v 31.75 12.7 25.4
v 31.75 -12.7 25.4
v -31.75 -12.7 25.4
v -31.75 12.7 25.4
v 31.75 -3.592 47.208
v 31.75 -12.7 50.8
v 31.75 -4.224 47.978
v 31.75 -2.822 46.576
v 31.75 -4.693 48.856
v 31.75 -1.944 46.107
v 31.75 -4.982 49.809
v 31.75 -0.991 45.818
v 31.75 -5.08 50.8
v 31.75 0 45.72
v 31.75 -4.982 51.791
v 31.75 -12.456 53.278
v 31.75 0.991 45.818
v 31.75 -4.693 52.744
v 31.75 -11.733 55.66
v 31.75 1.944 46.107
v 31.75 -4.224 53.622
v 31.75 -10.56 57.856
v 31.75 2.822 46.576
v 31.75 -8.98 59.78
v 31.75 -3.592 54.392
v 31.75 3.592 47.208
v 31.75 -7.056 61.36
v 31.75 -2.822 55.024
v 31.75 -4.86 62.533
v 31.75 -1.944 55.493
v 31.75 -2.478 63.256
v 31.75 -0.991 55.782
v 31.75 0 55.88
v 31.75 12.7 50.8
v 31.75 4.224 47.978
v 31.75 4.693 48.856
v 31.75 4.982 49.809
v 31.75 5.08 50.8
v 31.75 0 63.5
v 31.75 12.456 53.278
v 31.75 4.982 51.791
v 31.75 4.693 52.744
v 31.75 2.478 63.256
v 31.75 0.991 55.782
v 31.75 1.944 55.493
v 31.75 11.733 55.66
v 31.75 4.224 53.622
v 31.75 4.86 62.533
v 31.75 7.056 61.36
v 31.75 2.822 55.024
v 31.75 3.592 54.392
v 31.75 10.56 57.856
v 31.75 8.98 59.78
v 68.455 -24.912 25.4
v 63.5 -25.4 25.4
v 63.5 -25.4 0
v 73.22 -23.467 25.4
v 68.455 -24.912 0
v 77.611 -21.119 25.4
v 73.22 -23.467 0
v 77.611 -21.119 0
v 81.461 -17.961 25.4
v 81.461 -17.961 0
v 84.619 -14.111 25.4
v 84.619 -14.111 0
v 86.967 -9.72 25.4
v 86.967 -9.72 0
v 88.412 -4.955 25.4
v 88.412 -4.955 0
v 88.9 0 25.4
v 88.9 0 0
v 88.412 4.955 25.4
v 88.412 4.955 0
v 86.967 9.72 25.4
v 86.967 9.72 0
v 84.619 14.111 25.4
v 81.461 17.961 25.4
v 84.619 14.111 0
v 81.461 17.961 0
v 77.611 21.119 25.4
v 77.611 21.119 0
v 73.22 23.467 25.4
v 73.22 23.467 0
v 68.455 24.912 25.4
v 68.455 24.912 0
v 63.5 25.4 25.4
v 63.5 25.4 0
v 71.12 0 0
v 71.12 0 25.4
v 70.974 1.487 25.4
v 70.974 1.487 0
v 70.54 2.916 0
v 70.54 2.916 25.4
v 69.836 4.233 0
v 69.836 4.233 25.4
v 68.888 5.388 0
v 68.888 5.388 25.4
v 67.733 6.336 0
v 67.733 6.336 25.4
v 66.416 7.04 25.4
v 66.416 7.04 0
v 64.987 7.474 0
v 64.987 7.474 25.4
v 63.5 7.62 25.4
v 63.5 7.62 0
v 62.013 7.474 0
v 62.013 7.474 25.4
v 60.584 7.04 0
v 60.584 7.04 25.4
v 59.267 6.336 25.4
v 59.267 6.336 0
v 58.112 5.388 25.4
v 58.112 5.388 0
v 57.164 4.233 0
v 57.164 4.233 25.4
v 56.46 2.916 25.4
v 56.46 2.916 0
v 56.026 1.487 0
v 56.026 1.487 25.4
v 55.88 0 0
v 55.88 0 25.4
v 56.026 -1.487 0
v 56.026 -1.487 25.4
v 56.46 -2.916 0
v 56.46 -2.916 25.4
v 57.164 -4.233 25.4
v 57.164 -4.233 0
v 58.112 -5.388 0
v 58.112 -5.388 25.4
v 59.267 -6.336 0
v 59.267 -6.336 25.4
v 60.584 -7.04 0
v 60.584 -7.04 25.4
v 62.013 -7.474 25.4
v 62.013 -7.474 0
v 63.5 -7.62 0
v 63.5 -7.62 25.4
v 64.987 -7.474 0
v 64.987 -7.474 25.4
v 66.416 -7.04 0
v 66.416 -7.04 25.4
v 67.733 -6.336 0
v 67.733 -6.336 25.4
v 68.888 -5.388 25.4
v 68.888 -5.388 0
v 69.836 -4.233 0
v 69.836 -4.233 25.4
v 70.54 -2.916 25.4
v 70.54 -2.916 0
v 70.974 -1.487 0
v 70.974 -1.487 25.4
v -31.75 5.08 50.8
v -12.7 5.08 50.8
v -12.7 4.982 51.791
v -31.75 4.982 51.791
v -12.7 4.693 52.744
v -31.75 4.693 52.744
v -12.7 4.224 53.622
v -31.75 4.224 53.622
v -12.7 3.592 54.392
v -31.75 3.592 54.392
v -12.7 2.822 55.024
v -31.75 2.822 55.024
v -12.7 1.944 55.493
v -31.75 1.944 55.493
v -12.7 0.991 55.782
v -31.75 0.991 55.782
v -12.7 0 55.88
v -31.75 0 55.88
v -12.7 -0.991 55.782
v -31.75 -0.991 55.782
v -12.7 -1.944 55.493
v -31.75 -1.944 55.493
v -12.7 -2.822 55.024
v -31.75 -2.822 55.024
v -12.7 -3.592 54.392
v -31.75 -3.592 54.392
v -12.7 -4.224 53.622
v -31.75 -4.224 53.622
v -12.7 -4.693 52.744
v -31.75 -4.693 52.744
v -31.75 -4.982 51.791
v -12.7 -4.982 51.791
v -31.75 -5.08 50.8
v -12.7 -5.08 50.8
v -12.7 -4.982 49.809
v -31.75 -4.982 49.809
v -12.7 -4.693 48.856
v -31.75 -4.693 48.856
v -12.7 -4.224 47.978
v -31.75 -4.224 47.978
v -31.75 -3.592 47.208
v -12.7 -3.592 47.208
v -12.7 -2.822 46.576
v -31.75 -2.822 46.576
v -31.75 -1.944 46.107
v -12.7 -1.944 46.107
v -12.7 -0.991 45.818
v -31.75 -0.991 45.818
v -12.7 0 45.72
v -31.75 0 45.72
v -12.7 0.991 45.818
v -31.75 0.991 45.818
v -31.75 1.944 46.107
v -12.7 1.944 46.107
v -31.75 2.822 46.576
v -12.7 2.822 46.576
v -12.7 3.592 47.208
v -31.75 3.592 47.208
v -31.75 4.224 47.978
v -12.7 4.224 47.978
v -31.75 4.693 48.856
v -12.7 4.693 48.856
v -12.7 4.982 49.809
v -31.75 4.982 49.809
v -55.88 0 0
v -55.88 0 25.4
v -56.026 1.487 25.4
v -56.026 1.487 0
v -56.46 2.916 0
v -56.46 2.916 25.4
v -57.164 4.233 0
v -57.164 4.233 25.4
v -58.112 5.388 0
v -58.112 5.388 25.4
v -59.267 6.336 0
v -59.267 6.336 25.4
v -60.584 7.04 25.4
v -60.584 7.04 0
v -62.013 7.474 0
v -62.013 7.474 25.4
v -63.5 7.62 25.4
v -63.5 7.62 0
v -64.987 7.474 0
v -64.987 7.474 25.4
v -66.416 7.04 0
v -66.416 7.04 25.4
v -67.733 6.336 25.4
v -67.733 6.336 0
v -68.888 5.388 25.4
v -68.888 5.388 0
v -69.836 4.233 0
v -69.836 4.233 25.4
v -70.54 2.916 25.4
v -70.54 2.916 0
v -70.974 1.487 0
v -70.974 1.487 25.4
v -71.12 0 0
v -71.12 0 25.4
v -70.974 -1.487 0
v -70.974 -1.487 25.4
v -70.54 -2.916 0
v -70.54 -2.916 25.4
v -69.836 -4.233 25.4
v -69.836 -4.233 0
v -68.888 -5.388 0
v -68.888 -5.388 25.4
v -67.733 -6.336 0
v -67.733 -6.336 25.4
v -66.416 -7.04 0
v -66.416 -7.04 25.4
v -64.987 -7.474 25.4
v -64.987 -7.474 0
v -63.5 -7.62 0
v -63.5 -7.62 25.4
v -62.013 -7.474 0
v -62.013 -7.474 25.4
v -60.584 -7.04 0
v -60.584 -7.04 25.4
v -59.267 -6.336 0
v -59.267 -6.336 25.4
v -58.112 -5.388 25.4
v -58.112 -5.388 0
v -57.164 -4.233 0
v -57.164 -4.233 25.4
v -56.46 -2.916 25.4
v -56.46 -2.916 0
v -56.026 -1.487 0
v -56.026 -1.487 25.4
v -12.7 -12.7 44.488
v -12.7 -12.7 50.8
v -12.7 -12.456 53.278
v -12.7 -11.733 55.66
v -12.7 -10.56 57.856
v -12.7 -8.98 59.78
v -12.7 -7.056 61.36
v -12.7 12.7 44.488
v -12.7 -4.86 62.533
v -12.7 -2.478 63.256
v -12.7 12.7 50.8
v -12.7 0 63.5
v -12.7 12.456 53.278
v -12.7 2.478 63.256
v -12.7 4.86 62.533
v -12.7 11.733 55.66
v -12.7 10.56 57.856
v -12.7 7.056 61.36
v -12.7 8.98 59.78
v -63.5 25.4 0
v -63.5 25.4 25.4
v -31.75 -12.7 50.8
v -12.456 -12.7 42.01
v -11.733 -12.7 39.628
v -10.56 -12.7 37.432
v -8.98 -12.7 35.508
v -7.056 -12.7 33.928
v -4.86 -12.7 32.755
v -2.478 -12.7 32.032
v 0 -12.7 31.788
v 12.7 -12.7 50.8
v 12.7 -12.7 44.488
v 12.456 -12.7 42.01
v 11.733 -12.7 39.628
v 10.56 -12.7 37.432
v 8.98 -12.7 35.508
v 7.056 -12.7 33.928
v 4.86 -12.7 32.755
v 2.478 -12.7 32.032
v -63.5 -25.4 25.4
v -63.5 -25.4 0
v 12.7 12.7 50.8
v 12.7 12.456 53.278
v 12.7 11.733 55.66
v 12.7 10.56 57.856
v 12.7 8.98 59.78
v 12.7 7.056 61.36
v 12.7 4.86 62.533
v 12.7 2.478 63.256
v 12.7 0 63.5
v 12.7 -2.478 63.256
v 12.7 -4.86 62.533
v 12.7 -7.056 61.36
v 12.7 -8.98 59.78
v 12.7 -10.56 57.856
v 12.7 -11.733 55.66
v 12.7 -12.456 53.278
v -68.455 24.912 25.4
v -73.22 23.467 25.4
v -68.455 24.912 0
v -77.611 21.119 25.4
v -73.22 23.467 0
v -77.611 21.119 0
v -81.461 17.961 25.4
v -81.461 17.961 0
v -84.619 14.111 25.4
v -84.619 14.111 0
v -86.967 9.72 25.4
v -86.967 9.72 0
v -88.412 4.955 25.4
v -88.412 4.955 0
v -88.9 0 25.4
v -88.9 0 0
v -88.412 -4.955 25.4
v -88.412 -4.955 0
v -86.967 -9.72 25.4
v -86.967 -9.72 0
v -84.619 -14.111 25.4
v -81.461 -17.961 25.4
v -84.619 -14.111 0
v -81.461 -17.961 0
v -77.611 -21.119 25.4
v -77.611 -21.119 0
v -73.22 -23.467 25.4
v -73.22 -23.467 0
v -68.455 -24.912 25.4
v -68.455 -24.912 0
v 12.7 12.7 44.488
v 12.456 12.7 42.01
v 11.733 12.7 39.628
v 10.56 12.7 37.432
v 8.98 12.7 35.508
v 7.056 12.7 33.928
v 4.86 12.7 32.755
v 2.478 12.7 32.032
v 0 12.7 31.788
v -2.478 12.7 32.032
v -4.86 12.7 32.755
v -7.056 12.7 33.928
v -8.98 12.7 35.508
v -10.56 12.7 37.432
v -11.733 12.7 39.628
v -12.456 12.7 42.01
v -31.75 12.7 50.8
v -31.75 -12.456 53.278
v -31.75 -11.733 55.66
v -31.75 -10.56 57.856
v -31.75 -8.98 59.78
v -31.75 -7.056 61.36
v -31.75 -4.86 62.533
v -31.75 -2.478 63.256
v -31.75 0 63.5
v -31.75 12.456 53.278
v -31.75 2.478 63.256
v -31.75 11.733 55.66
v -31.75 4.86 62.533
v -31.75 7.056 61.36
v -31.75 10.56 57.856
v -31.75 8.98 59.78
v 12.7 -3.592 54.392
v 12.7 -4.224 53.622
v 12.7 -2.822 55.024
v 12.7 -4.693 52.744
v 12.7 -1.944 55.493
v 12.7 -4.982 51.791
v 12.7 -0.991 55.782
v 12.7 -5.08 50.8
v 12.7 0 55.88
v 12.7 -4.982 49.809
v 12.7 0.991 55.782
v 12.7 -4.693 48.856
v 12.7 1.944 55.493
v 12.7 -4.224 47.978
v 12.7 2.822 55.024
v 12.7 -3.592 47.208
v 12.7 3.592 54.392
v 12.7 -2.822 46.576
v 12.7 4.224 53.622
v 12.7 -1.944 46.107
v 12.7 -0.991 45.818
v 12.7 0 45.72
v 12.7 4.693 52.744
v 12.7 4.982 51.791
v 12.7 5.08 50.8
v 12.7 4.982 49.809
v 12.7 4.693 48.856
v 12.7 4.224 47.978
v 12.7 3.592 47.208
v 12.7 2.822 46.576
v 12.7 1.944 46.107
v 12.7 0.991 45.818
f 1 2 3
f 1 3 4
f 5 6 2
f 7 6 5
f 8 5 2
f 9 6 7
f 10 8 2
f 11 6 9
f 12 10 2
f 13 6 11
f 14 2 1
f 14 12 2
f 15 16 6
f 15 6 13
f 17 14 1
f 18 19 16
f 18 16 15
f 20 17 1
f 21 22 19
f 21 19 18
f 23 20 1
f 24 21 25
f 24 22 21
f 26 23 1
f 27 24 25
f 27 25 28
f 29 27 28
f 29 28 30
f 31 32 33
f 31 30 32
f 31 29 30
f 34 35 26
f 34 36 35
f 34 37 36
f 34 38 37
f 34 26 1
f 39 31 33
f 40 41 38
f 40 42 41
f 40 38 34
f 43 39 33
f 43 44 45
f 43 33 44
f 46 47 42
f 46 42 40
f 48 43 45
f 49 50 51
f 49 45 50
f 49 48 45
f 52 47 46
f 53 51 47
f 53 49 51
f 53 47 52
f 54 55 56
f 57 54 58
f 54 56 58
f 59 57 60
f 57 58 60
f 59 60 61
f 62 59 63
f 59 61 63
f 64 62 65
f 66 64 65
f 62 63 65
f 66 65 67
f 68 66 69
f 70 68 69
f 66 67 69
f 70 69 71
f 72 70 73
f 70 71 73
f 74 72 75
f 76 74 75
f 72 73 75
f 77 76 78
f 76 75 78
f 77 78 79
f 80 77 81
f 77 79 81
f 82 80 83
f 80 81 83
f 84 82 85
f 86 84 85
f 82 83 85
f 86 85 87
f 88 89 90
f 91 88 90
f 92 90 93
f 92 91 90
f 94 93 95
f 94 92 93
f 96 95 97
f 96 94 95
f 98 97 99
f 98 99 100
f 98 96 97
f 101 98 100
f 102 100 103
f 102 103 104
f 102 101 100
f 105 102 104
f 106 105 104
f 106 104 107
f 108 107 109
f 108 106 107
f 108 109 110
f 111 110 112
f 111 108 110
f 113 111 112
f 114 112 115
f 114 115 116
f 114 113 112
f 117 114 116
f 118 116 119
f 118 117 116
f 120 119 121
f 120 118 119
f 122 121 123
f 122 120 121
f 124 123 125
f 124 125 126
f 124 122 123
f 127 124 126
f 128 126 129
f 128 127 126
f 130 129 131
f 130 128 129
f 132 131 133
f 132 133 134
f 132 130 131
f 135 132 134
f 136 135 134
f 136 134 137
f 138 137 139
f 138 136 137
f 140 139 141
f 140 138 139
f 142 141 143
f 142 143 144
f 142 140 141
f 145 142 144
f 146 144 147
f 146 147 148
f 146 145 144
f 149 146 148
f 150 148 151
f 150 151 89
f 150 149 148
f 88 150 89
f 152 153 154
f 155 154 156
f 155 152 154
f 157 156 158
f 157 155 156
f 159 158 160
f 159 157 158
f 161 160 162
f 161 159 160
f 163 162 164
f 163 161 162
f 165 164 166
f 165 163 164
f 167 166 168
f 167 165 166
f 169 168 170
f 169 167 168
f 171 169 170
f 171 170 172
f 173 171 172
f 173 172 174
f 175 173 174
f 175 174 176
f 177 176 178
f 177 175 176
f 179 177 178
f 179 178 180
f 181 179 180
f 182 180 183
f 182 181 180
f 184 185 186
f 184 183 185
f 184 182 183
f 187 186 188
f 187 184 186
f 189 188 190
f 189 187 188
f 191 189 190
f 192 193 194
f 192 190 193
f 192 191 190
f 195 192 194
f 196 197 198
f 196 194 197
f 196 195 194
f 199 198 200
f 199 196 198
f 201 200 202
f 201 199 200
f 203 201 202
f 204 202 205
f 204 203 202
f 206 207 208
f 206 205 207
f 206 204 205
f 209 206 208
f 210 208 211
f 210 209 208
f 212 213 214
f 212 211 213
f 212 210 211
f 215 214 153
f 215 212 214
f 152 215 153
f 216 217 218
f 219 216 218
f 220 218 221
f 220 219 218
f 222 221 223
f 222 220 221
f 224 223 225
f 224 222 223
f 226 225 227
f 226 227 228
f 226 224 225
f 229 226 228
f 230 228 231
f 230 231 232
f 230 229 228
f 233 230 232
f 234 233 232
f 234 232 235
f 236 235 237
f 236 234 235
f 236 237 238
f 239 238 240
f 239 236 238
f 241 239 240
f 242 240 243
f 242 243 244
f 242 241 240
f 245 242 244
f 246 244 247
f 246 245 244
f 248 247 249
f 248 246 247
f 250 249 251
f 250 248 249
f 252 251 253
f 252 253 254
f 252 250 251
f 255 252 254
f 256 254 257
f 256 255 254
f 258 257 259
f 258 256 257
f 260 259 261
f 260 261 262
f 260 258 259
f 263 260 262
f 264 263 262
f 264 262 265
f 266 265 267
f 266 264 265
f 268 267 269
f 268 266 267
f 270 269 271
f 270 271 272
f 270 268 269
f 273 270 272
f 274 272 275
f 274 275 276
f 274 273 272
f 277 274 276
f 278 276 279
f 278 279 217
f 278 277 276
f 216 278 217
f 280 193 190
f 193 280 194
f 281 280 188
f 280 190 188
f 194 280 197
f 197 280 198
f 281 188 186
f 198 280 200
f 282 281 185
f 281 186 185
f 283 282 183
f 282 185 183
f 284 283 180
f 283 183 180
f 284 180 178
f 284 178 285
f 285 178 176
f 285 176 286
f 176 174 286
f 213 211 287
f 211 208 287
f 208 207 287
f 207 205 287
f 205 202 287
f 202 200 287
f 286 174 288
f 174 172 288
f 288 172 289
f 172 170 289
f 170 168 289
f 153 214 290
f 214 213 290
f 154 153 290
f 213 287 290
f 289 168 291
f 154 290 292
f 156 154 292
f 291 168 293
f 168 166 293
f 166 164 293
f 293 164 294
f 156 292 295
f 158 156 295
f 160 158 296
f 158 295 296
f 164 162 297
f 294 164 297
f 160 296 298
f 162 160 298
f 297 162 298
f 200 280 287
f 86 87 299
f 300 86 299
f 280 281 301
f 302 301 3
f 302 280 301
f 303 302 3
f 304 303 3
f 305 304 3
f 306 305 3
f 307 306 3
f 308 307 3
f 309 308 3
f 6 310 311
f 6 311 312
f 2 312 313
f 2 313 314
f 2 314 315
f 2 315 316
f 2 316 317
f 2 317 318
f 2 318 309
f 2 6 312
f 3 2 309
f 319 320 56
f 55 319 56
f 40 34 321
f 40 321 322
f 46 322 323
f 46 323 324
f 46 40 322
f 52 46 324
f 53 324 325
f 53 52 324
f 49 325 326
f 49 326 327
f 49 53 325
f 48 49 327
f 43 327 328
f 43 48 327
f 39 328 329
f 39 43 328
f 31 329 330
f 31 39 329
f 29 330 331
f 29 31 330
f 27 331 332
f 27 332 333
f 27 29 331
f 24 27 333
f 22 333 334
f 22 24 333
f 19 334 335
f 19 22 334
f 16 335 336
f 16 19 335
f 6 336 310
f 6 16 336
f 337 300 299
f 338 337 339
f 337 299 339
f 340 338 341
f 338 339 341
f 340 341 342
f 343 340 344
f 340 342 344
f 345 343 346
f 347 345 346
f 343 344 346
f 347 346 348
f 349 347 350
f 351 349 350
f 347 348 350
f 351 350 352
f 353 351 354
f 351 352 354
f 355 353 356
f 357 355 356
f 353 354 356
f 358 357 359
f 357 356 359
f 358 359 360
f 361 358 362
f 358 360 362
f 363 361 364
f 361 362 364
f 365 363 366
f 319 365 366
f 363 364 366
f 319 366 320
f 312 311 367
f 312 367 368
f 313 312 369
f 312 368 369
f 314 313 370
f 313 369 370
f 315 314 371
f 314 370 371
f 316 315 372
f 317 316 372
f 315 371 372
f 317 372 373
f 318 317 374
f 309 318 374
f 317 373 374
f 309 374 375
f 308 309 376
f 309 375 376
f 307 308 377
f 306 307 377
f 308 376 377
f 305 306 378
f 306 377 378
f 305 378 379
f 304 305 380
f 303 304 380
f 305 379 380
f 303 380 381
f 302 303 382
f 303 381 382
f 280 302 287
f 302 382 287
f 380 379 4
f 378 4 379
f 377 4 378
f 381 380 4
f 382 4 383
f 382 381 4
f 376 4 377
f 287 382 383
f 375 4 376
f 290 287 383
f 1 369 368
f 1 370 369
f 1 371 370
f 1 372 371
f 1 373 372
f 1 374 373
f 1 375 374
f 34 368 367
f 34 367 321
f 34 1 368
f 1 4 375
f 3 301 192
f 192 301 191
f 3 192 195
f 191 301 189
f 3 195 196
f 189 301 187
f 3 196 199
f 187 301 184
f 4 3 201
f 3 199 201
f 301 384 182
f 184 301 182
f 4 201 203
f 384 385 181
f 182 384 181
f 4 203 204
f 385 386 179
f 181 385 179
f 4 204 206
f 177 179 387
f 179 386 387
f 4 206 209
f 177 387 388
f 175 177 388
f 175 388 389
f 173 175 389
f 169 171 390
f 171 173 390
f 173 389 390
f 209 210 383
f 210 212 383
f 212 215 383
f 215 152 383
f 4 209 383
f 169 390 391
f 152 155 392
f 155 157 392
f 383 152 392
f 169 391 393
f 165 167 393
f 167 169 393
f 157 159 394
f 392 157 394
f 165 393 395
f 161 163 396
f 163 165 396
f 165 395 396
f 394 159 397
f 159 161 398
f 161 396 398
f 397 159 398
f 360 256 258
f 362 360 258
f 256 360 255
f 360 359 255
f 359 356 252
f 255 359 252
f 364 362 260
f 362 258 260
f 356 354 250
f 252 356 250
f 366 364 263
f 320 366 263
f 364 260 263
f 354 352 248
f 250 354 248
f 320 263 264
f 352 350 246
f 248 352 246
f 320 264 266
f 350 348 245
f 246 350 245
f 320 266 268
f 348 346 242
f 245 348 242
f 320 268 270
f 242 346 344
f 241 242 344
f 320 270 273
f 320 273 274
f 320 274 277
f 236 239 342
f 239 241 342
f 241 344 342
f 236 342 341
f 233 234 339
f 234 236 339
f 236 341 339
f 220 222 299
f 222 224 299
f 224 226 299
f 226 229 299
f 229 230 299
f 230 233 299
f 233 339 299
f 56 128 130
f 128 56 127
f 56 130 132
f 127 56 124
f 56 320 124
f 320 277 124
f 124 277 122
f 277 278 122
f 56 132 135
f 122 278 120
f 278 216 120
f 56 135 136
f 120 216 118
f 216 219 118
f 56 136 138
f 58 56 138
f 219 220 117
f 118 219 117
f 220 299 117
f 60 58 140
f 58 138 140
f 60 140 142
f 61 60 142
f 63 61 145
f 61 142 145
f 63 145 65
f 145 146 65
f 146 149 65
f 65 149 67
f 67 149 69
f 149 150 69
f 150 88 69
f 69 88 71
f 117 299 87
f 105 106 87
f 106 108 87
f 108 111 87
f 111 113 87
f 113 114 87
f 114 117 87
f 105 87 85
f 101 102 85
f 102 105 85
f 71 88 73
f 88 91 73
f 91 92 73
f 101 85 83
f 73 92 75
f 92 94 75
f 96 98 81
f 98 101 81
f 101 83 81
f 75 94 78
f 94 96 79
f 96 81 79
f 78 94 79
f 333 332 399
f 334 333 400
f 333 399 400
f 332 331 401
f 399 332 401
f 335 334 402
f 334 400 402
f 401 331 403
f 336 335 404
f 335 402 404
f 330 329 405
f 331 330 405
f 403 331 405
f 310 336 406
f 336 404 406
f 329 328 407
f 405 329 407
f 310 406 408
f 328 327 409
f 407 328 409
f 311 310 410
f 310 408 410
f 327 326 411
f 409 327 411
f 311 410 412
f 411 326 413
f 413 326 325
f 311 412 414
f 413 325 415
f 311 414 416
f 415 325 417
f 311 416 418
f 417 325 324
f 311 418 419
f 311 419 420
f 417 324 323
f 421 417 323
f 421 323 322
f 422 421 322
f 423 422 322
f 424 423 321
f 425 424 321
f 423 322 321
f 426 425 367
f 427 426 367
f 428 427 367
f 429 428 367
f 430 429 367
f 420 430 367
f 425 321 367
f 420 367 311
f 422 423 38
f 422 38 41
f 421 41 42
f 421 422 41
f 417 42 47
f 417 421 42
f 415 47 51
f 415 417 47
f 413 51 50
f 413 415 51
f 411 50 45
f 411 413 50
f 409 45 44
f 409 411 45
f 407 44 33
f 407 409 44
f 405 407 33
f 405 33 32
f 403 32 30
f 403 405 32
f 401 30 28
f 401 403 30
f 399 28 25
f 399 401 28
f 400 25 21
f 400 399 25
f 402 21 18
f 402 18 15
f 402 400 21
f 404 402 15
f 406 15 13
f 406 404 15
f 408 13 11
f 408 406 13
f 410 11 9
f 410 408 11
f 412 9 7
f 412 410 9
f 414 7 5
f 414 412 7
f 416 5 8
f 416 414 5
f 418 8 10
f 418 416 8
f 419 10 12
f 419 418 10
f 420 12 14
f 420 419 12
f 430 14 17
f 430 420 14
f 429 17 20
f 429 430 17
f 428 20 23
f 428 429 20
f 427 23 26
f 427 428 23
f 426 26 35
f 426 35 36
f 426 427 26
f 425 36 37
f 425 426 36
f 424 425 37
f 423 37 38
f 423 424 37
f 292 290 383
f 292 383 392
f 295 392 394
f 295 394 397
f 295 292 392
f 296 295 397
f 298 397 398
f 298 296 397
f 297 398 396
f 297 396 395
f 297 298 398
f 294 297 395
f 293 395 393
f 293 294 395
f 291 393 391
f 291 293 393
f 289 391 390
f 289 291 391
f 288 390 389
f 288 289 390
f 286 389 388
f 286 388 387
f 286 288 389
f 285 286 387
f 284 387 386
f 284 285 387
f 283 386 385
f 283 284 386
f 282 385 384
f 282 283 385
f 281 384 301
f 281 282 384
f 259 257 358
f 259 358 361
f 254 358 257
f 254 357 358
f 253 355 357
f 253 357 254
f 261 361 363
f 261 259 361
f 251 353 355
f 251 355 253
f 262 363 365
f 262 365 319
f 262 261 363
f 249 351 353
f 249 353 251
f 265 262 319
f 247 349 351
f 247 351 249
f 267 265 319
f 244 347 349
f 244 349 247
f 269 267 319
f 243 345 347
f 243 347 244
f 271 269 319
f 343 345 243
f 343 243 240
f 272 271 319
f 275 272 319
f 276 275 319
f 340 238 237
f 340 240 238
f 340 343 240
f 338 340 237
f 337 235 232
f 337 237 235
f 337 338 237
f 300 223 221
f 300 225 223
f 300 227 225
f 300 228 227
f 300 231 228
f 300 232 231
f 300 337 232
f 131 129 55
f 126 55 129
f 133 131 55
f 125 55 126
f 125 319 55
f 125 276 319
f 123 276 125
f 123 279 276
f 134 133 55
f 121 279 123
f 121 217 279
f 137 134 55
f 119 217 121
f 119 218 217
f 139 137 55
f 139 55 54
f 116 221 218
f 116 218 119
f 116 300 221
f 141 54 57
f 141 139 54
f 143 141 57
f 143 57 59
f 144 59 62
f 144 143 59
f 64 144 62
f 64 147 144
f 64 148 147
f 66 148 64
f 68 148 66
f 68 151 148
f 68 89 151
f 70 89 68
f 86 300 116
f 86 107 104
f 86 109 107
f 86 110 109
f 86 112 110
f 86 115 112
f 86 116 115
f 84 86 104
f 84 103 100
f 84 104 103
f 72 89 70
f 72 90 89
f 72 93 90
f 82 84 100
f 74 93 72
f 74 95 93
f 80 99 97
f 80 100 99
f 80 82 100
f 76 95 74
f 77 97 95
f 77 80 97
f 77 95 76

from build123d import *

# Parameters (mm, degrees)
F0_R     = 7.62
F1_DEPTH = 25.4
F2_R     = 5.08
F3_DEPTH = 31.75
F4_W     = 25.4
F4_H     = 16.951743
F5_DEPTH = 25.4


with BuildPart() as f1:
    # F0 (on Top) → F1 (new body)
    with BuildSketch(Plane.XY):
        with BuildLine():
            Line((63.5, 25.4), (-63.5, 25.4))
            ThreePointArc((-63.5, 25.4), (-88.9, 0), (-63.5, -25.4))
            Line((-63.5, -25.4), (63.5, -25.4))
            ThreePointArc((63.5, -25.4), (88.9, 0), (63.5, 25.4))
        make_face()
        with Locations((-63.5, 0)):
            Circle(F0_R, mode=Mode.SUBTRACT)
        with Locations((63.5, 0)):
            Circle(F0_R, mode=Mode.SUBTRACT)
    extrude(amount=F1_DEPTH)


with BuildPart() as f3:
    # F2 (on Right) → F3 (new body, symmetric)
    with BuildSketch(Plane.YZ):
        with BuildLine():
            Line((-12.7, 50.8), (-12.7, 25.4))
            Line((-12.7, 25.4), (12.7, 25.4))
            Line((12.7, 25.4), (12.7, 50.8))
            ThreePointArc((12.7, 50.8), (0, 63.5), (-12.7, 50.8))
        make_face()
        with Locations((0, 50.8)):
            Circle(F2_R, mode=Mode.SUBTRACT)
    extrude(amount=F3_DEPTH, both=True)

    # F4 (on face) → F5 (cut)
    with BuildSketch(Plane(origin=(0, 12.7, 0), x_dir=(-1, 0, 0), z_dir=(0, 1, 0))):
        with BuildLine():
            Line((-12.7, 50.8), (-12.7, 44.488117))
            ThreePointArc((-12.7, 44.488117), (0, 31.788117), (12.7, 44.488117))
            Line((12.7, 44.488117), (12.7, 50.8))
            Line((12.7, 50.8), (-12.7, 50.8))
        make_face()
        with Locations((0, 59.275871)):
            Rectangle(F4_W, F4_H)
    extrude(amount=-F5_DEPTH, mode=Mode.SUBTRACT)


solid = Compound([f1.part, f3.part])
